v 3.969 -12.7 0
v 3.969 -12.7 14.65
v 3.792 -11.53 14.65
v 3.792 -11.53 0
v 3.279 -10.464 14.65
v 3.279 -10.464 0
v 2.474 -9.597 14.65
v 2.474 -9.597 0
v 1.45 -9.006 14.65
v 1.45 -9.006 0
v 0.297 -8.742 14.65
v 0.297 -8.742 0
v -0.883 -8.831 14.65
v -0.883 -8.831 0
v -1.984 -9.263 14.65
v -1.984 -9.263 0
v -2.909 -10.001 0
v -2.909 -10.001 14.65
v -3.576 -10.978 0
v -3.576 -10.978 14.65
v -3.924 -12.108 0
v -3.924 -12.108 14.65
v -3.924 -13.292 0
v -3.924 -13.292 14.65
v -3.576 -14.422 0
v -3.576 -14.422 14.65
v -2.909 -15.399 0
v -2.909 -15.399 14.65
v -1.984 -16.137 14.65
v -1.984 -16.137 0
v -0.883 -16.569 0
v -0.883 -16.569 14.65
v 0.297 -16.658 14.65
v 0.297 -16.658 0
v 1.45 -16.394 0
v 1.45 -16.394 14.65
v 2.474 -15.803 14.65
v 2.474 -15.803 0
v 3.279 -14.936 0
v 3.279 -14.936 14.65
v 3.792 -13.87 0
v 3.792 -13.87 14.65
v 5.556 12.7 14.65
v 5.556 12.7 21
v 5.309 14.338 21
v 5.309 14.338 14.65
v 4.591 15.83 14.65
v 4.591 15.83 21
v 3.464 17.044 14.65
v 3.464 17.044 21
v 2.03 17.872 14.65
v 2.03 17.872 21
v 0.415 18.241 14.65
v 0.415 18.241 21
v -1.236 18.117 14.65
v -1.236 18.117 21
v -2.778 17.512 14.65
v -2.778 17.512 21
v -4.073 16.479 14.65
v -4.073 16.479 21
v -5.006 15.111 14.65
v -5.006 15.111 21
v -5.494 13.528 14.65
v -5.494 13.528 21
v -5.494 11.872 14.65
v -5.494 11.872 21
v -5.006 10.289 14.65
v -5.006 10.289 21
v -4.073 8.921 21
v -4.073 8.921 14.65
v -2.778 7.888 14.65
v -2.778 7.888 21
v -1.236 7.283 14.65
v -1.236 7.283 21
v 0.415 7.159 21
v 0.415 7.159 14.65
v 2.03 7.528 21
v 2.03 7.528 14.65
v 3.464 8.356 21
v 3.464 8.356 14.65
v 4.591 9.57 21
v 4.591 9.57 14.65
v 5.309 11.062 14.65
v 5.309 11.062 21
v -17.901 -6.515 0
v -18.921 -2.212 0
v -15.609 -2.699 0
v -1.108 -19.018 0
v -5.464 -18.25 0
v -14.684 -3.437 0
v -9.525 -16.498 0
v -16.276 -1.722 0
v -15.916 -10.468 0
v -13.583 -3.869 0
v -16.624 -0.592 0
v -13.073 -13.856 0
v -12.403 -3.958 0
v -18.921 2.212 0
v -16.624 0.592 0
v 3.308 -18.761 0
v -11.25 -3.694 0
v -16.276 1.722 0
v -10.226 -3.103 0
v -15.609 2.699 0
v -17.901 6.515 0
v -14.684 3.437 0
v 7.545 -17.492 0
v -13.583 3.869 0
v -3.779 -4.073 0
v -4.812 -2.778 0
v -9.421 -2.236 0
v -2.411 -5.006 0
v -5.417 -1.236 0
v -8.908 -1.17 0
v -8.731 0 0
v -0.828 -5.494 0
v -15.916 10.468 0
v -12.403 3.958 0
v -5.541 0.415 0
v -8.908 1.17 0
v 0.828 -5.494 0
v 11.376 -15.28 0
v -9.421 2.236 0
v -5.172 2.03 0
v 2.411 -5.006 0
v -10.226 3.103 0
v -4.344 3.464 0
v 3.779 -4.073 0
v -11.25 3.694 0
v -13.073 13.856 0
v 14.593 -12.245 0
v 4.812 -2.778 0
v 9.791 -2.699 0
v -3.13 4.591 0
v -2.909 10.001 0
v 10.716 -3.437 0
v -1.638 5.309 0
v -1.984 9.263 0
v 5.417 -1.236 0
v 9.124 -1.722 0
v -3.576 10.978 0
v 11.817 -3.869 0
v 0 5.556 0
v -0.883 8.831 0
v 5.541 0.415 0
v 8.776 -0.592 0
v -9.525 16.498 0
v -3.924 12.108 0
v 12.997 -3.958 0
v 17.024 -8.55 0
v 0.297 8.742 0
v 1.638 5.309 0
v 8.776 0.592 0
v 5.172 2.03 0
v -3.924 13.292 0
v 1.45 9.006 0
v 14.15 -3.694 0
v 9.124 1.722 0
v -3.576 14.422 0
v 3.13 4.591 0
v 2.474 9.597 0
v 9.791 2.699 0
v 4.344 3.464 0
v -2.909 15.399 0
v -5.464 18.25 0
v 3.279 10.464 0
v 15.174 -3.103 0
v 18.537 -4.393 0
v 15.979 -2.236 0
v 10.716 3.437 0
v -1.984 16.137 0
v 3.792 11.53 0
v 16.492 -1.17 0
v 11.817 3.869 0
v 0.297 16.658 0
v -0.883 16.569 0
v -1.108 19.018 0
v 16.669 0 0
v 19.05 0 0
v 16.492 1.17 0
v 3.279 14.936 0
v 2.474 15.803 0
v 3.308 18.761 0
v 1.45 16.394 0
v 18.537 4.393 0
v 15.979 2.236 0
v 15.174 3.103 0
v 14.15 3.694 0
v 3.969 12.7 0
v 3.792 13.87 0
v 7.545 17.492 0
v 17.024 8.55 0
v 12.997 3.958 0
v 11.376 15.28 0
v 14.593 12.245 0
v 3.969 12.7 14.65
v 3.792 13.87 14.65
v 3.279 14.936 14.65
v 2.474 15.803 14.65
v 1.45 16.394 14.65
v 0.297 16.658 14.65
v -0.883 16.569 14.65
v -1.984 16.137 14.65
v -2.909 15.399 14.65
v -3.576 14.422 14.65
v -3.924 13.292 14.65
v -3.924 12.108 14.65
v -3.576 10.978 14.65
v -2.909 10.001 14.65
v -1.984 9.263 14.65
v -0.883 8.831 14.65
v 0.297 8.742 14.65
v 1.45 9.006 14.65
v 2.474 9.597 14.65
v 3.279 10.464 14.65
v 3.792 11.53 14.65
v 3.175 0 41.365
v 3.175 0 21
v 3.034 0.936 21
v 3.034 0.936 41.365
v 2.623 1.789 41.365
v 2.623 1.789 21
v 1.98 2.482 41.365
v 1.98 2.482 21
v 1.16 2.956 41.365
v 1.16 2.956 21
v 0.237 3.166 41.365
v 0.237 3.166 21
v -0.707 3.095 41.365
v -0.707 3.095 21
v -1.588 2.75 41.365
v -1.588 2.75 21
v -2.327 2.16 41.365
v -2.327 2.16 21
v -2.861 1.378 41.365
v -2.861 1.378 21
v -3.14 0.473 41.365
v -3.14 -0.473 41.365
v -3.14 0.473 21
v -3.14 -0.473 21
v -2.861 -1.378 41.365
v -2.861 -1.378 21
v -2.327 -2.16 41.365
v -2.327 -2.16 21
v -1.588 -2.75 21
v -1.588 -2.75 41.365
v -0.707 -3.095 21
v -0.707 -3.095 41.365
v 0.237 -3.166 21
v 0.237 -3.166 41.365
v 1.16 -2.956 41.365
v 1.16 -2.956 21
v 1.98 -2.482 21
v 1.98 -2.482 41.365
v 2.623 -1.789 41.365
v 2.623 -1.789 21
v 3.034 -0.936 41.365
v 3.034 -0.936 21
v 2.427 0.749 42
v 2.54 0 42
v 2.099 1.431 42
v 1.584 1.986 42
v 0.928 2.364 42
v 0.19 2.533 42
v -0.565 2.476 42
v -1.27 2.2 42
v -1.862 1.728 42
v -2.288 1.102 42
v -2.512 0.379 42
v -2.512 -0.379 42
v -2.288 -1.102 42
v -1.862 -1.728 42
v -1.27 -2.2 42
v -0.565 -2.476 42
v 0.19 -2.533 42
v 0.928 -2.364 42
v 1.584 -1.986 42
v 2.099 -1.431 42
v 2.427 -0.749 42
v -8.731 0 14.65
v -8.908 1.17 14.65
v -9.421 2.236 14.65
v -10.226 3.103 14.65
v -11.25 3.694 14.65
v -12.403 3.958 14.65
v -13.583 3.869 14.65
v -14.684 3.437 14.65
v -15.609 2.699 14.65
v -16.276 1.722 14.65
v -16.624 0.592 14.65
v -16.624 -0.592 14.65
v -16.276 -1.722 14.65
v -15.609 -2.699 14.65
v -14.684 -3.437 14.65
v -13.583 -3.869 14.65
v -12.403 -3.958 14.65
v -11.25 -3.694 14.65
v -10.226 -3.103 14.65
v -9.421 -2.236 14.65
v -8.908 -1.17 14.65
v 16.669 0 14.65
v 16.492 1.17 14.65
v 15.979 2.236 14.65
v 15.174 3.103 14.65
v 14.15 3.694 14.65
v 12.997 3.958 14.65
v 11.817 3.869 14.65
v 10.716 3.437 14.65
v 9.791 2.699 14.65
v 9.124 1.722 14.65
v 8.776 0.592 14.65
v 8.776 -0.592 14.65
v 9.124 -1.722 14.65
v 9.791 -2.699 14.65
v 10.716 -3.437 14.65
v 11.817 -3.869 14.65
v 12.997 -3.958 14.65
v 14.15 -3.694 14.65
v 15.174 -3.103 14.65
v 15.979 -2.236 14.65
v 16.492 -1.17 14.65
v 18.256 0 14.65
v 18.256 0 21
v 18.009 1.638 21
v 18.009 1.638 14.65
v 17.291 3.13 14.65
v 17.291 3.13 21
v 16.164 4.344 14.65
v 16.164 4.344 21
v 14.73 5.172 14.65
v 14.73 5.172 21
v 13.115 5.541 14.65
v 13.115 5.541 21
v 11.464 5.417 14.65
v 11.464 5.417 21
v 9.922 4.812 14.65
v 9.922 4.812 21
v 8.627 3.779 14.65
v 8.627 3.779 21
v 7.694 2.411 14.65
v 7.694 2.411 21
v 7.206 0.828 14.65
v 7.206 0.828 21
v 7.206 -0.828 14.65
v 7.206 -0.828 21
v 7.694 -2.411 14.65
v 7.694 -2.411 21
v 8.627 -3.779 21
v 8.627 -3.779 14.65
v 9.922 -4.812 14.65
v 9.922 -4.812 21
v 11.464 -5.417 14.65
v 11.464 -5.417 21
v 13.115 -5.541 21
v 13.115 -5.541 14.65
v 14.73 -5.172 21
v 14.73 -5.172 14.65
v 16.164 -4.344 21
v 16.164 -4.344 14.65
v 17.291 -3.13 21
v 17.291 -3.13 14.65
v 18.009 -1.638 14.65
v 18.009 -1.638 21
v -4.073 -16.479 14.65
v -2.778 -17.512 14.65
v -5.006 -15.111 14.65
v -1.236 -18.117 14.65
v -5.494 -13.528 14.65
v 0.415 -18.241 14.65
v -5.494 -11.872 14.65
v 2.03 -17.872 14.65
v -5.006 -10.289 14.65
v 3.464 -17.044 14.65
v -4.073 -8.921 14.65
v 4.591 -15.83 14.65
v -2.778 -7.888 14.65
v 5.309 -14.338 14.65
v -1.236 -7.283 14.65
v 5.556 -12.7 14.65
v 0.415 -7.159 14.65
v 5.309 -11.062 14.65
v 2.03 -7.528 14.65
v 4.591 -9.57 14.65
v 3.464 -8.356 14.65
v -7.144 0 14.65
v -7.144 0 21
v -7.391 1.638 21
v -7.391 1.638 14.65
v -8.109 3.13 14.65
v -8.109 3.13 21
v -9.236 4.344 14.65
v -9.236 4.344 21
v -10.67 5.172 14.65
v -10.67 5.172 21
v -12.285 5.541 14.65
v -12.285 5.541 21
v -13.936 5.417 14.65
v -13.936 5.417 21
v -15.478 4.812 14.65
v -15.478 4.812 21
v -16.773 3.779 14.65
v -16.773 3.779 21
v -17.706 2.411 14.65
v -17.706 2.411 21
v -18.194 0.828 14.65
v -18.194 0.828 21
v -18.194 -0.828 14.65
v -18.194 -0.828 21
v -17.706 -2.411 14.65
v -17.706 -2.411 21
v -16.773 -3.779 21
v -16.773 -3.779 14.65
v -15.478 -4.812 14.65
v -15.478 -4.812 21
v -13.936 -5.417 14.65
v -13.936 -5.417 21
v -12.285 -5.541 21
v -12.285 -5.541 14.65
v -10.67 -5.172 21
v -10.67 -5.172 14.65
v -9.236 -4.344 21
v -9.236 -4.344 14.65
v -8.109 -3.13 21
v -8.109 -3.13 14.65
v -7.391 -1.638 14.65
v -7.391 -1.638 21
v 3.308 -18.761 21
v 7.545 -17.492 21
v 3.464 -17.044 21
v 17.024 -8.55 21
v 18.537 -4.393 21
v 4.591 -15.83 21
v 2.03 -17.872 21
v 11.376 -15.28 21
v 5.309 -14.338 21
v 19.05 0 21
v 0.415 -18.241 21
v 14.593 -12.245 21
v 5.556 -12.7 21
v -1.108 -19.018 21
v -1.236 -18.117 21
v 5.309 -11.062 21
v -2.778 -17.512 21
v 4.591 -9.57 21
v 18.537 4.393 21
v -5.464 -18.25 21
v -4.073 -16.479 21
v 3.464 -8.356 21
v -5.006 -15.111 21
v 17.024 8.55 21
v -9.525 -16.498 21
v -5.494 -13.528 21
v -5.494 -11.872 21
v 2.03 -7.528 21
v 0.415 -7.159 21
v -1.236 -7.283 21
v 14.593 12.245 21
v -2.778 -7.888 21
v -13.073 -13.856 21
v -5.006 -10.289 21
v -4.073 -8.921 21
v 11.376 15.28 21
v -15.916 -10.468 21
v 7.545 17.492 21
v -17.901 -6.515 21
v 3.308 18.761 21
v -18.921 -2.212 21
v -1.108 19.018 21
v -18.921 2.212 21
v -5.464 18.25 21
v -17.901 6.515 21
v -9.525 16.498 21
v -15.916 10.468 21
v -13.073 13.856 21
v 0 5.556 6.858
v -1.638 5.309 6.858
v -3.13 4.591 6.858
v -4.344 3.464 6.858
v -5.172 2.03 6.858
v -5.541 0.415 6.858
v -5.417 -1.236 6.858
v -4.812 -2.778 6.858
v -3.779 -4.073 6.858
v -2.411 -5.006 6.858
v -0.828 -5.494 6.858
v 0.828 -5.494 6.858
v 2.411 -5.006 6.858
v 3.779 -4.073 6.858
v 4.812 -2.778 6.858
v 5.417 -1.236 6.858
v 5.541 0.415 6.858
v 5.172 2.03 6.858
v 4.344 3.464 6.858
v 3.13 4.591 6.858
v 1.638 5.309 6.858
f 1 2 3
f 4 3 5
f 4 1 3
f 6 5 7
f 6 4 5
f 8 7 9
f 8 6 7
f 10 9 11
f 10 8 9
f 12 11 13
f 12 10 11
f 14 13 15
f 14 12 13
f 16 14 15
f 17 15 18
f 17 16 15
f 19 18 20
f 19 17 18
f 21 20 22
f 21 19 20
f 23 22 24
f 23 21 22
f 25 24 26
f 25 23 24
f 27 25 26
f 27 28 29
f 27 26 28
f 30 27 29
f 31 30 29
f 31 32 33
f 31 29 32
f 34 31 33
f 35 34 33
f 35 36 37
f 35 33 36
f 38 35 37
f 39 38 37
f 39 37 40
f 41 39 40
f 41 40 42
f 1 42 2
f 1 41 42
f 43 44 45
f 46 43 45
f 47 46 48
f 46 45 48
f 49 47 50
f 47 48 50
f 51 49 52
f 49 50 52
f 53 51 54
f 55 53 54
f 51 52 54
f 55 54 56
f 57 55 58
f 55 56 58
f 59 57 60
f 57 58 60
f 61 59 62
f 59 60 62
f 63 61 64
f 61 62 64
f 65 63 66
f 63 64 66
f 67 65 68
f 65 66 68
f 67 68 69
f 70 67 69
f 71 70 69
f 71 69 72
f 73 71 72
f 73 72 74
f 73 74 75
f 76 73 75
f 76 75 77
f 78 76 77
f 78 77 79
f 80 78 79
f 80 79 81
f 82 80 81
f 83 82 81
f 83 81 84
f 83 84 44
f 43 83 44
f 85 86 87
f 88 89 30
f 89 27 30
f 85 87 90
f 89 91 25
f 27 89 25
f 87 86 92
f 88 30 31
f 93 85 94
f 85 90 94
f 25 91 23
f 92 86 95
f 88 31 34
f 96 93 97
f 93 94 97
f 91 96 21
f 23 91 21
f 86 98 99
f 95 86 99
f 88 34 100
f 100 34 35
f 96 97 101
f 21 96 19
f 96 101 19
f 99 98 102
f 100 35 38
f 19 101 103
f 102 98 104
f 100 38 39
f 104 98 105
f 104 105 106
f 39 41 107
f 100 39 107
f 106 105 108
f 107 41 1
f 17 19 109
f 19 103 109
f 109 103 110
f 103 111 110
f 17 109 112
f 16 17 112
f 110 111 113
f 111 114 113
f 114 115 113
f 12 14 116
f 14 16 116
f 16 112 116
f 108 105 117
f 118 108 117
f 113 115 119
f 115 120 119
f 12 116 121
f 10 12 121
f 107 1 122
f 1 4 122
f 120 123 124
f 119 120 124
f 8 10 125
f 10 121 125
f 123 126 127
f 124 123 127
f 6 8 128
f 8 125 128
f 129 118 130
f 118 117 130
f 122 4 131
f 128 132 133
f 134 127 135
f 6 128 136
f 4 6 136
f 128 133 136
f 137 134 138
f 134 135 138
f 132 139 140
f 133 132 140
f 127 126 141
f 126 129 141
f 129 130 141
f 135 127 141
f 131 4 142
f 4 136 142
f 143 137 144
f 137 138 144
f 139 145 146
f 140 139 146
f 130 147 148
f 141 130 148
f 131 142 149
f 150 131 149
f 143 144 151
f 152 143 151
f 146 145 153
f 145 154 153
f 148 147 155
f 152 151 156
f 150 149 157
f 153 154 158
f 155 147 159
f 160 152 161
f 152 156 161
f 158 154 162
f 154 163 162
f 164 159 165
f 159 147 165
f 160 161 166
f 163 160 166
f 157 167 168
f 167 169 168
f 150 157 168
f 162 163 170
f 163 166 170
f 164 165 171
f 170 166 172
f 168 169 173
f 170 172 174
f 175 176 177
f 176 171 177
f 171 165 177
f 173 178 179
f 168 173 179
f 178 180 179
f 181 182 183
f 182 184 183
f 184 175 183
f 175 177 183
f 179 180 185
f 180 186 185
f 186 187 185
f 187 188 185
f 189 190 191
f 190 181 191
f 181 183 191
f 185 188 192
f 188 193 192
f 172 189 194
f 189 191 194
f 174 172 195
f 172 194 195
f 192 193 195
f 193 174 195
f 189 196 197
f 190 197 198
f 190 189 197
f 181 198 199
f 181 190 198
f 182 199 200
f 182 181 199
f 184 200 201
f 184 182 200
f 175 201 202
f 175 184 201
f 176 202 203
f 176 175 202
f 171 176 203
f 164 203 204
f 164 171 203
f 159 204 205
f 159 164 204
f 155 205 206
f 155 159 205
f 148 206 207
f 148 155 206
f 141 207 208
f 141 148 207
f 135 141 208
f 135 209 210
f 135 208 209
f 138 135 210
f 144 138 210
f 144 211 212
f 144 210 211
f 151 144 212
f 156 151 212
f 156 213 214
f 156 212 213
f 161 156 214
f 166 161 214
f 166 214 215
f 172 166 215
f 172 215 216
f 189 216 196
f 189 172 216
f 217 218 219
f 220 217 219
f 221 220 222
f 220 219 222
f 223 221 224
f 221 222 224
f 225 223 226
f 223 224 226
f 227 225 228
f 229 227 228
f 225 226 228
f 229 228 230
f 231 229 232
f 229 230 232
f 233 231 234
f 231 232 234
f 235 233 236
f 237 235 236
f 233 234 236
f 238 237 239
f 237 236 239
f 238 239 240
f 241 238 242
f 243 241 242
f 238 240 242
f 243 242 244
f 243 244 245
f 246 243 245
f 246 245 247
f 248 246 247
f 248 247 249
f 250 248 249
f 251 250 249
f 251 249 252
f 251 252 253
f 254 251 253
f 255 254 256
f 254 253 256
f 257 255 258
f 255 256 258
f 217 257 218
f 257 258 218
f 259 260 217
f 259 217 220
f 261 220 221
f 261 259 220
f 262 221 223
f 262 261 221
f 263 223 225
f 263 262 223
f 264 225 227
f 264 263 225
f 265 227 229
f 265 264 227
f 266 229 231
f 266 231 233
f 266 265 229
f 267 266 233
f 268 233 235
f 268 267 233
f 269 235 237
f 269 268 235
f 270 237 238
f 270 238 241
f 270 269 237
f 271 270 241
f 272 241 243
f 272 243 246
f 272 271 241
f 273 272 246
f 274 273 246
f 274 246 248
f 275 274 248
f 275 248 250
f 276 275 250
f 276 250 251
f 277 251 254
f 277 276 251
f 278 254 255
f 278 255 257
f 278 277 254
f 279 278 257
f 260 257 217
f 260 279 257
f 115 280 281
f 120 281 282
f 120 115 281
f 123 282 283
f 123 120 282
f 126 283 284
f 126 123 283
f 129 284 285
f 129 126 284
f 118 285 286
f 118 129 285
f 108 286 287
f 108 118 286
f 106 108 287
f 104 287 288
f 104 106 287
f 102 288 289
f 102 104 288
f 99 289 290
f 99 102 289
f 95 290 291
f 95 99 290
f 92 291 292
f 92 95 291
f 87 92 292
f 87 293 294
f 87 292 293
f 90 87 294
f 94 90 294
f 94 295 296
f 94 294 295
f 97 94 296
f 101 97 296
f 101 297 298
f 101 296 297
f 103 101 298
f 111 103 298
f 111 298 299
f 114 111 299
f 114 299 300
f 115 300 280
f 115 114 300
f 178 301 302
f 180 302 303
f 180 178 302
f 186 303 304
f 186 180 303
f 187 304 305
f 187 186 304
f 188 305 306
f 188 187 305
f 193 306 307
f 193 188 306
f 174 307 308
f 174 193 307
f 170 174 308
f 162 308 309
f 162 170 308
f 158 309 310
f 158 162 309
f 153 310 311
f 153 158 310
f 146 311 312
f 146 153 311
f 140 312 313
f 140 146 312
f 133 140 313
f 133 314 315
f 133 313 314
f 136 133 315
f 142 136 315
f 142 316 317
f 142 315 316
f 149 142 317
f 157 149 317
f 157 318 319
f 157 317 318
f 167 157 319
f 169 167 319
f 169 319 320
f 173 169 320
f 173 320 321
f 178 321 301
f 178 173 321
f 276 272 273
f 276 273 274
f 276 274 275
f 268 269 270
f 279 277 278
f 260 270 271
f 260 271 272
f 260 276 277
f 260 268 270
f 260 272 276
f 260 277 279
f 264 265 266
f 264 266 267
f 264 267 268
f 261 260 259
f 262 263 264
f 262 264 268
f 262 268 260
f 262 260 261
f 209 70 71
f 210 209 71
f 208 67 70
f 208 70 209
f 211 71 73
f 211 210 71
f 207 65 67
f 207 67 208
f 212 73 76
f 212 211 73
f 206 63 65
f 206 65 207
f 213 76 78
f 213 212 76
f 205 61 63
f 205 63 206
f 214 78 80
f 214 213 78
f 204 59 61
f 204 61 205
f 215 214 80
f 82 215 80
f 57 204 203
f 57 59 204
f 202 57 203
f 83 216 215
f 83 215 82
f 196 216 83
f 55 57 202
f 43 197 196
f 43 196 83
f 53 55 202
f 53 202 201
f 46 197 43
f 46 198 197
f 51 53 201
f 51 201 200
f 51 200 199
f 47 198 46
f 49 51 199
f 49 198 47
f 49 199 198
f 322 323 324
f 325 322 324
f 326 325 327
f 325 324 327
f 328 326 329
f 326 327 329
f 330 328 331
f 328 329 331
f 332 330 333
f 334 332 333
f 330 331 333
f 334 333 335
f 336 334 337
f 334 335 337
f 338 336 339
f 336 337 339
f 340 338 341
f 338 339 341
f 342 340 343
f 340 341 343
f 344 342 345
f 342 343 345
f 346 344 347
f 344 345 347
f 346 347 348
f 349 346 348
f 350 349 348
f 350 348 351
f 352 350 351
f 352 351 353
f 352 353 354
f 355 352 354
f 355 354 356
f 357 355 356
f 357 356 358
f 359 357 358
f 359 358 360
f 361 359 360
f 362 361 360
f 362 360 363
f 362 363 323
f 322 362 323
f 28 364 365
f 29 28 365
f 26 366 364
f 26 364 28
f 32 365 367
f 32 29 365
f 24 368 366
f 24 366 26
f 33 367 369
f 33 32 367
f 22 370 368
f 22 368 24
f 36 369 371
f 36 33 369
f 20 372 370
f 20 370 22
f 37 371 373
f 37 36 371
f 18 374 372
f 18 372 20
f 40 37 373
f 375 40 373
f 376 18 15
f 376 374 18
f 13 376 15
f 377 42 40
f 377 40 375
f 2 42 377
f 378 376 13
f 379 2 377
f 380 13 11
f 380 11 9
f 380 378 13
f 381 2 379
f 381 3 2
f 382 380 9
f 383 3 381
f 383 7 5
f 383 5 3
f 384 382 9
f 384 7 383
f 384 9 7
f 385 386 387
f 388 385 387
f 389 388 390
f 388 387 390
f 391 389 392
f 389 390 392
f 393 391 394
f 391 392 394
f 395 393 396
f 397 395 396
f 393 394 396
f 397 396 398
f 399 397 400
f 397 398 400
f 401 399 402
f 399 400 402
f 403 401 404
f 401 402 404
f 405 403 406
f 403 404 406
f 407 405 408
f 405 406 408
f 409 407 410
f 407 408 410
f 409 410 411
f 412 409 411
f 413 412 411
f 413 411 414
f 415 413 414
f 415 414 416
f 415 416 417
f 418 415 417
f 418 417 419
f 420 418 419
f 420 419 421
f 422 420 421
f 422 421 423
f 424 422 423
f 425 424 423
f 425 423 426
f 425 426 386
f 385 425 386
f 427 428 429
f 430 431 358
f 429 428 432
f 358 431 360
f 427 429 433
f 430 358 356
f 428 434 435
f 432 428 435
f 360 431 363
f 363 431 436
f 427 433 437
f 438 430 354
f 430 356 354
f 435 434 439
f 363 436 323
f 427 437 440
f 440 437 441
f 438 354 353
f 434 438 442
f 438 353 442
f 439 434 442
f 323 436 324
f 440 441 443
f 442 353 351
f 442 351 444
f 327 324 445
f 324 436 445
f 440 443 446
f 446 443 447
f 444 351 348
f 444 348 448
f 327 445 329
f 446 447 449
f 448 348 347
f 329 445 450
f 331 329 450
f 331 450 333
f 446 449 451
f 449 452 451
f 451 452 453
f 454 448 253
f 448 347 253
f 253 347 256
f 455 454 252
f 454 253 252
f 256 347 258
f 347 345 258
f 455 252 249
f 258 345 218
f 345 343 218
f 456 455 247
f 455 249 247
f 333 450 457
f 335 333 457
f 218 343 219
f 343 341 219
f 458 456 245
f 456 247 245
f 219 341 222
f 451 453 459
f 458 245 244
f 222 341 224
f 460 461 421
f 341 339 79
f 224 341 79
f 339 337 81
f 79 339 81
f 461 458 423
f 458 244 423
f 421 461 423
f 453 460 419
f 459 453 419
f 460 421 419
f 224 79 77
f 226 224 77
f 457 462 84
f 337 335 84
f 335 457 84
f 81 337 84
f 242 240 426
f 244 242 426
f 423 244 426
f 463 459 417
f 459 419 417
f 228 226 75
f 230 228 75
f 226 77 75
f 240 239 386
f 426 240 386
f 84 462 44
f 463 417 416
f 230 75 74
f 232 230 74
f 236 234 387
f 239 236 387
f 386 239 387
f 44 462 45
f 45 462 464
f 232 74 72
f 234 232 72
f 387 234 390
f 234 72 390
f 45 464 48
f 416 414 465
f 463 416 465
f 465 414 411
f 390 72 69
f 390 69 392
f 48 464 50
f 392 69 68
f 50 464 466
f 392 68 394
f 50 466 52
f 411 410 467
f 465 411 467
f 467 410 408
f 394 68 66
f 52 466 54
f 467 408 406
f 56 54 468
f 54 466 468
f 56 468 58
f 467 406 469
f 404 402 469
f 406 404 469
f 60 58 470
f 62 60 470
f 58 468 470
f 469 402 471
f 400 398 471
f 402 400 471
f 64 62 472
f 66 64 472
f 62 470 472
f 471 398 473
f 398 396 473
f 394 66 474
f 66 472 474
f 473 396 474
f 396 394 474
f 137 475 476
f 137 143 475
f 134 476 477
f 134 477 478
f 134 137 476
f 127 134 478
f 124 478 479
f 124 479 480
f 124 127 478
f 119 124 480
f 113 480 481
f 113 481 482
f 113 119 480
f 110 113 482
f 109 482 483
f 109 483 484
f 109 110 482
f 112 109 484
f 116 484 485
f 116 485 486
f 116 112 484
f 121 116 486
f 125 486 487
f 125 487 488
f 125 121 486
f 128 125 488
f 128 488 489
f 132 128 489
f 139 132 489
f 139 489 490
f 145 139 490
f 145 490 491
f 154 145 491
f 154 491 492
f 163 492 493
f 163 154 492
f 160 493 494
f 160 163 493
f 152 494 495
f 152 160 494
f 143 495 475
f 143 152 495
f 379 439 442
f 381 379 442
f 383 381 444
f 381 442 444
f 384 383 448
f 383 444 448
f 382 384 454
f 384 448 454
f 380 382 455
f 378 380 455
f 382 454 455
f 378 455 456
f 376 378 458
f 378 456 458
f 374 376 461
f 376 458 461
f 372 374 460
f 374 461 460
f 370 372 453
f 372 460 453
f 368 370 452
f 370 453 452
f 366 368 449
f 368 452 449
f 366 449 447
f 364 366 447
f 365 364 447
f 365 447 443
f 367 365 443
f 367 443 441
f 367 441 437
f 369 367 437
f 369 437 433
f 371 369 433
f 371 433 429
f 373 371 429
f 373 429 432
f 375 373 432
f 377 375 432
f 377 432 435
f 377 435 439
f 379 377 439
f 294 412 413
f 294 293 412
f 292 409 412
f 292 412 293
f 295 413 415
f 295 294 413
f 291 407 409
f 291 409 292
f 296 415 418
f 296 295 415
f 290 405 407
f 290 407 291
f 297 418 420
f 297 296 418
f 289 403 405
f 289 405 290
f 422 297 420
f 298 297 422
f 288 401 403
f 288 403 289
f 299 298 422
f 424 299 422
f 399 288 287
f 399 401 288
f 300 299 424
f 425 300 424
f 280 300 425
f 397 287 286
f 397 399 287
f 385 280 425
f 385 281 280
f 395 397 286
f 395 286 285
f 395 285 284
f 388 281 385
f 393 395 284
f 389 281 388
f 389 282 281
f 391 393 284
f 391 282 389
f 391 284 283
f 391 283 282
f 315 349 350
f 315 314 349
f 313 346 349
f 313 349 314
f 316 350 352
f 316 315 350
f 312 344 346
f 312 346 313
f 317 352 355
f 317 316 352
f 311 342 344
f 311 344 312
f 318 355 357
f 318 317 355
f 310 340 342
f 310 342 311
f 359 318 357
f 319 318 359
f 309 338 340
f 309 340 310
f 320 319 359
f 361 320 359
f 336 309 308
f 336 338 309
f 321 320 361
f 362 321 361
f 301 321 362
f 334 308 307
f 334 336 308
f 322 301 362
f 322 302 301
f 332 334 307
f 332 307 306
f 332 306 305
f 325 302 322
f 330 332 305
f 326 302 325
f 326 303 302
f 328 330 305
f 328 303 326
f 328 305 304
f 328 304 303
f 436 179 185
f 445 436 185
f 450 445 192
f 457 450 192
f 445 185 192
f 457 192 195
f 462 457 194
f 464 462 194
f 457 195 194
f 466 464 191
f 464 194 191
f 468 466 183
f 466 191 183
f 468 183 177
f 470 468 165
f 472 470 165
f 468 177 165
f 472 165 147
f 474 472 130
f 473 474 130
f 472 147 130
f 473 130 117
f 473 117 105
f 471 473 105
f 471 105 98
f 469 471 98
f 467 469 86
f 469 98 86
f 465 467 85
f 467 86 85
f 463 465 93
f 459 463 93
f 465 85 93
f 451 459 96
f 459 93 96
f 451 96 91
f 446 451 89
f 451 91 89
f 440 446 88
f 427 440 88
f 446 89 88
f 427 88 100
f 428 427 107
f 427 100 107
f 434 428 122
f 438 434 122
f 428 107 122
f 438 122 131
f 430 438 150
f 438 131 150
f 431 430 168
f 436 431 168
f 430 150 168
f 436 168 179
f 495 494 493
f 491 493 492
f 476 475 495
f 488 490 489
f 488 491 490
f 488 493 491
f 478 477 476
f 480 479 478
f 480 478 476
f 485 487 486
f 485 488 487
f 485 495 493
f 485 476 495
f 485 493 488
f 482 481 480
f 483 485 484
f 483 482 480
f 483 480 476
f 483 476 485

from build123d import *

# Parameters (mm, degrees)
SKETCH1_R                                        = 19.05
SKETCH1_R_2                                      = 5
SKETCH1_R_3                                      = 3.96875
BOSS_EXTRUDE1_DEPTH                              = 21
BOSS_EXTRUDE2_START                              = -14.142
SKETCH3_R                                        = 5
BOSS_EXTRUDE2_DEPTH                              = 14.142
SKETCH4_R                                        = 3.175
BOSS_EXTRUDE3_DEPTH                              = 21
CHAMFER1_SIZE                                    = 0.635
CBORE_FOR_1_4_SOCKET_HEAD_CAP_SCREW1_D           = 6.7564
CBORE_FOR_1_4_SOCKET_HEAD_CAP_SCREW1_CBORE_D     = 11.1125
CBORE_FOR_1_4_SOCKET_HEAD_CAP_SCREW1_CBORE_DEPTH = 6.35


with BuildPart() as part:
    # Sketch1 → Boss-Extrude1 (new body)
    with BuildSketch(Plane.XY):
        Circle(SKETCH1_R)
        Circle(SKETCH1_R_2, mode=Mode.SUBTRACT)
        with Locations((0, 12.7)):
            Circle(SKETCH1_R_3, mode=Mode.SUBTRACT)
        with Locations((12.7, 0)):
            Circle(SKETCH1_R_3, mode=Mode.SUBTRACT)
        with Locations((0, -12.7)):
            Circle(SKETCH1_R_3, mode=Mode.SUBTRACT)
        with Locations((-12.7, 0)):
            Circle(SKETCH1_R_3, mode=Mode.SUBTRACT)
    extrude(amount=BOSS_EXTRUDE1_DEPTH)

    # Sketch3 → Boss-Extrude2 (add)
    with BuildSketch(Plane(origin=(0, 0, 6.858), x_dir=(-1, 0, 0), z_dir=(0, 0, -1)).offset(BOSS_EXTRUDE2_START)):
        Circle(SKETCH3_R)
    extrude(amount=BOSS_EXTRUDE2_DEPTH)

    # Sketch4 → Boss-Extrude3 (add)
    with BuildSketch(Plane.XY.offset(21)):
        Circle(SKETCH4_R)
    extrude(amount=BOSS_EXTRUDE3_DEPTH)

    # Chamfer1
    chamfer1_edges = [part.edges().sort_by_distance(p)[0] for p in [
        (-3.175, 0, 42),
    ]]
    chamfer(chamfer1_edges, length=CHAMFER1_SIZE)

    # CBORE for 1/4 Socket Head Cap Screw1 (through all)
    with Locations(Plane.XY.offset(21)):
        with Locations((0, 12.7), (12.7, 0), (0, -12.7), (-12.7, 0)):
            CounterBoreHole(CBORE_FOR_1_4_SOCKET_HEAD_CAP_SCREW1_D / 2, CBORE_FOR_1_4_SOCKET_HEAD_CAP_SCREW1_CBORE_D / 2, CBORE_FOR_1_4_SOCKET_HEAD_CAP_SCREW1_CBORE_DEPTH)

    # Sketch7 → CBORE for 1/4 Socket Head Cap Screw2 (revolve, cut)
    with BuildSketch(Plane.YZ):
        Polygon((0, 0), (0, 2.055227343), (3.3782, 0.0254), (3.3782, 6.858), (5.55625, 6.858), (5.55625, 0), align=None)
    revolve(axis=Axis((0, 0, -6.35), (0, 0, 1)), mode=Mode.SUBTRACT)


solid = part.part
